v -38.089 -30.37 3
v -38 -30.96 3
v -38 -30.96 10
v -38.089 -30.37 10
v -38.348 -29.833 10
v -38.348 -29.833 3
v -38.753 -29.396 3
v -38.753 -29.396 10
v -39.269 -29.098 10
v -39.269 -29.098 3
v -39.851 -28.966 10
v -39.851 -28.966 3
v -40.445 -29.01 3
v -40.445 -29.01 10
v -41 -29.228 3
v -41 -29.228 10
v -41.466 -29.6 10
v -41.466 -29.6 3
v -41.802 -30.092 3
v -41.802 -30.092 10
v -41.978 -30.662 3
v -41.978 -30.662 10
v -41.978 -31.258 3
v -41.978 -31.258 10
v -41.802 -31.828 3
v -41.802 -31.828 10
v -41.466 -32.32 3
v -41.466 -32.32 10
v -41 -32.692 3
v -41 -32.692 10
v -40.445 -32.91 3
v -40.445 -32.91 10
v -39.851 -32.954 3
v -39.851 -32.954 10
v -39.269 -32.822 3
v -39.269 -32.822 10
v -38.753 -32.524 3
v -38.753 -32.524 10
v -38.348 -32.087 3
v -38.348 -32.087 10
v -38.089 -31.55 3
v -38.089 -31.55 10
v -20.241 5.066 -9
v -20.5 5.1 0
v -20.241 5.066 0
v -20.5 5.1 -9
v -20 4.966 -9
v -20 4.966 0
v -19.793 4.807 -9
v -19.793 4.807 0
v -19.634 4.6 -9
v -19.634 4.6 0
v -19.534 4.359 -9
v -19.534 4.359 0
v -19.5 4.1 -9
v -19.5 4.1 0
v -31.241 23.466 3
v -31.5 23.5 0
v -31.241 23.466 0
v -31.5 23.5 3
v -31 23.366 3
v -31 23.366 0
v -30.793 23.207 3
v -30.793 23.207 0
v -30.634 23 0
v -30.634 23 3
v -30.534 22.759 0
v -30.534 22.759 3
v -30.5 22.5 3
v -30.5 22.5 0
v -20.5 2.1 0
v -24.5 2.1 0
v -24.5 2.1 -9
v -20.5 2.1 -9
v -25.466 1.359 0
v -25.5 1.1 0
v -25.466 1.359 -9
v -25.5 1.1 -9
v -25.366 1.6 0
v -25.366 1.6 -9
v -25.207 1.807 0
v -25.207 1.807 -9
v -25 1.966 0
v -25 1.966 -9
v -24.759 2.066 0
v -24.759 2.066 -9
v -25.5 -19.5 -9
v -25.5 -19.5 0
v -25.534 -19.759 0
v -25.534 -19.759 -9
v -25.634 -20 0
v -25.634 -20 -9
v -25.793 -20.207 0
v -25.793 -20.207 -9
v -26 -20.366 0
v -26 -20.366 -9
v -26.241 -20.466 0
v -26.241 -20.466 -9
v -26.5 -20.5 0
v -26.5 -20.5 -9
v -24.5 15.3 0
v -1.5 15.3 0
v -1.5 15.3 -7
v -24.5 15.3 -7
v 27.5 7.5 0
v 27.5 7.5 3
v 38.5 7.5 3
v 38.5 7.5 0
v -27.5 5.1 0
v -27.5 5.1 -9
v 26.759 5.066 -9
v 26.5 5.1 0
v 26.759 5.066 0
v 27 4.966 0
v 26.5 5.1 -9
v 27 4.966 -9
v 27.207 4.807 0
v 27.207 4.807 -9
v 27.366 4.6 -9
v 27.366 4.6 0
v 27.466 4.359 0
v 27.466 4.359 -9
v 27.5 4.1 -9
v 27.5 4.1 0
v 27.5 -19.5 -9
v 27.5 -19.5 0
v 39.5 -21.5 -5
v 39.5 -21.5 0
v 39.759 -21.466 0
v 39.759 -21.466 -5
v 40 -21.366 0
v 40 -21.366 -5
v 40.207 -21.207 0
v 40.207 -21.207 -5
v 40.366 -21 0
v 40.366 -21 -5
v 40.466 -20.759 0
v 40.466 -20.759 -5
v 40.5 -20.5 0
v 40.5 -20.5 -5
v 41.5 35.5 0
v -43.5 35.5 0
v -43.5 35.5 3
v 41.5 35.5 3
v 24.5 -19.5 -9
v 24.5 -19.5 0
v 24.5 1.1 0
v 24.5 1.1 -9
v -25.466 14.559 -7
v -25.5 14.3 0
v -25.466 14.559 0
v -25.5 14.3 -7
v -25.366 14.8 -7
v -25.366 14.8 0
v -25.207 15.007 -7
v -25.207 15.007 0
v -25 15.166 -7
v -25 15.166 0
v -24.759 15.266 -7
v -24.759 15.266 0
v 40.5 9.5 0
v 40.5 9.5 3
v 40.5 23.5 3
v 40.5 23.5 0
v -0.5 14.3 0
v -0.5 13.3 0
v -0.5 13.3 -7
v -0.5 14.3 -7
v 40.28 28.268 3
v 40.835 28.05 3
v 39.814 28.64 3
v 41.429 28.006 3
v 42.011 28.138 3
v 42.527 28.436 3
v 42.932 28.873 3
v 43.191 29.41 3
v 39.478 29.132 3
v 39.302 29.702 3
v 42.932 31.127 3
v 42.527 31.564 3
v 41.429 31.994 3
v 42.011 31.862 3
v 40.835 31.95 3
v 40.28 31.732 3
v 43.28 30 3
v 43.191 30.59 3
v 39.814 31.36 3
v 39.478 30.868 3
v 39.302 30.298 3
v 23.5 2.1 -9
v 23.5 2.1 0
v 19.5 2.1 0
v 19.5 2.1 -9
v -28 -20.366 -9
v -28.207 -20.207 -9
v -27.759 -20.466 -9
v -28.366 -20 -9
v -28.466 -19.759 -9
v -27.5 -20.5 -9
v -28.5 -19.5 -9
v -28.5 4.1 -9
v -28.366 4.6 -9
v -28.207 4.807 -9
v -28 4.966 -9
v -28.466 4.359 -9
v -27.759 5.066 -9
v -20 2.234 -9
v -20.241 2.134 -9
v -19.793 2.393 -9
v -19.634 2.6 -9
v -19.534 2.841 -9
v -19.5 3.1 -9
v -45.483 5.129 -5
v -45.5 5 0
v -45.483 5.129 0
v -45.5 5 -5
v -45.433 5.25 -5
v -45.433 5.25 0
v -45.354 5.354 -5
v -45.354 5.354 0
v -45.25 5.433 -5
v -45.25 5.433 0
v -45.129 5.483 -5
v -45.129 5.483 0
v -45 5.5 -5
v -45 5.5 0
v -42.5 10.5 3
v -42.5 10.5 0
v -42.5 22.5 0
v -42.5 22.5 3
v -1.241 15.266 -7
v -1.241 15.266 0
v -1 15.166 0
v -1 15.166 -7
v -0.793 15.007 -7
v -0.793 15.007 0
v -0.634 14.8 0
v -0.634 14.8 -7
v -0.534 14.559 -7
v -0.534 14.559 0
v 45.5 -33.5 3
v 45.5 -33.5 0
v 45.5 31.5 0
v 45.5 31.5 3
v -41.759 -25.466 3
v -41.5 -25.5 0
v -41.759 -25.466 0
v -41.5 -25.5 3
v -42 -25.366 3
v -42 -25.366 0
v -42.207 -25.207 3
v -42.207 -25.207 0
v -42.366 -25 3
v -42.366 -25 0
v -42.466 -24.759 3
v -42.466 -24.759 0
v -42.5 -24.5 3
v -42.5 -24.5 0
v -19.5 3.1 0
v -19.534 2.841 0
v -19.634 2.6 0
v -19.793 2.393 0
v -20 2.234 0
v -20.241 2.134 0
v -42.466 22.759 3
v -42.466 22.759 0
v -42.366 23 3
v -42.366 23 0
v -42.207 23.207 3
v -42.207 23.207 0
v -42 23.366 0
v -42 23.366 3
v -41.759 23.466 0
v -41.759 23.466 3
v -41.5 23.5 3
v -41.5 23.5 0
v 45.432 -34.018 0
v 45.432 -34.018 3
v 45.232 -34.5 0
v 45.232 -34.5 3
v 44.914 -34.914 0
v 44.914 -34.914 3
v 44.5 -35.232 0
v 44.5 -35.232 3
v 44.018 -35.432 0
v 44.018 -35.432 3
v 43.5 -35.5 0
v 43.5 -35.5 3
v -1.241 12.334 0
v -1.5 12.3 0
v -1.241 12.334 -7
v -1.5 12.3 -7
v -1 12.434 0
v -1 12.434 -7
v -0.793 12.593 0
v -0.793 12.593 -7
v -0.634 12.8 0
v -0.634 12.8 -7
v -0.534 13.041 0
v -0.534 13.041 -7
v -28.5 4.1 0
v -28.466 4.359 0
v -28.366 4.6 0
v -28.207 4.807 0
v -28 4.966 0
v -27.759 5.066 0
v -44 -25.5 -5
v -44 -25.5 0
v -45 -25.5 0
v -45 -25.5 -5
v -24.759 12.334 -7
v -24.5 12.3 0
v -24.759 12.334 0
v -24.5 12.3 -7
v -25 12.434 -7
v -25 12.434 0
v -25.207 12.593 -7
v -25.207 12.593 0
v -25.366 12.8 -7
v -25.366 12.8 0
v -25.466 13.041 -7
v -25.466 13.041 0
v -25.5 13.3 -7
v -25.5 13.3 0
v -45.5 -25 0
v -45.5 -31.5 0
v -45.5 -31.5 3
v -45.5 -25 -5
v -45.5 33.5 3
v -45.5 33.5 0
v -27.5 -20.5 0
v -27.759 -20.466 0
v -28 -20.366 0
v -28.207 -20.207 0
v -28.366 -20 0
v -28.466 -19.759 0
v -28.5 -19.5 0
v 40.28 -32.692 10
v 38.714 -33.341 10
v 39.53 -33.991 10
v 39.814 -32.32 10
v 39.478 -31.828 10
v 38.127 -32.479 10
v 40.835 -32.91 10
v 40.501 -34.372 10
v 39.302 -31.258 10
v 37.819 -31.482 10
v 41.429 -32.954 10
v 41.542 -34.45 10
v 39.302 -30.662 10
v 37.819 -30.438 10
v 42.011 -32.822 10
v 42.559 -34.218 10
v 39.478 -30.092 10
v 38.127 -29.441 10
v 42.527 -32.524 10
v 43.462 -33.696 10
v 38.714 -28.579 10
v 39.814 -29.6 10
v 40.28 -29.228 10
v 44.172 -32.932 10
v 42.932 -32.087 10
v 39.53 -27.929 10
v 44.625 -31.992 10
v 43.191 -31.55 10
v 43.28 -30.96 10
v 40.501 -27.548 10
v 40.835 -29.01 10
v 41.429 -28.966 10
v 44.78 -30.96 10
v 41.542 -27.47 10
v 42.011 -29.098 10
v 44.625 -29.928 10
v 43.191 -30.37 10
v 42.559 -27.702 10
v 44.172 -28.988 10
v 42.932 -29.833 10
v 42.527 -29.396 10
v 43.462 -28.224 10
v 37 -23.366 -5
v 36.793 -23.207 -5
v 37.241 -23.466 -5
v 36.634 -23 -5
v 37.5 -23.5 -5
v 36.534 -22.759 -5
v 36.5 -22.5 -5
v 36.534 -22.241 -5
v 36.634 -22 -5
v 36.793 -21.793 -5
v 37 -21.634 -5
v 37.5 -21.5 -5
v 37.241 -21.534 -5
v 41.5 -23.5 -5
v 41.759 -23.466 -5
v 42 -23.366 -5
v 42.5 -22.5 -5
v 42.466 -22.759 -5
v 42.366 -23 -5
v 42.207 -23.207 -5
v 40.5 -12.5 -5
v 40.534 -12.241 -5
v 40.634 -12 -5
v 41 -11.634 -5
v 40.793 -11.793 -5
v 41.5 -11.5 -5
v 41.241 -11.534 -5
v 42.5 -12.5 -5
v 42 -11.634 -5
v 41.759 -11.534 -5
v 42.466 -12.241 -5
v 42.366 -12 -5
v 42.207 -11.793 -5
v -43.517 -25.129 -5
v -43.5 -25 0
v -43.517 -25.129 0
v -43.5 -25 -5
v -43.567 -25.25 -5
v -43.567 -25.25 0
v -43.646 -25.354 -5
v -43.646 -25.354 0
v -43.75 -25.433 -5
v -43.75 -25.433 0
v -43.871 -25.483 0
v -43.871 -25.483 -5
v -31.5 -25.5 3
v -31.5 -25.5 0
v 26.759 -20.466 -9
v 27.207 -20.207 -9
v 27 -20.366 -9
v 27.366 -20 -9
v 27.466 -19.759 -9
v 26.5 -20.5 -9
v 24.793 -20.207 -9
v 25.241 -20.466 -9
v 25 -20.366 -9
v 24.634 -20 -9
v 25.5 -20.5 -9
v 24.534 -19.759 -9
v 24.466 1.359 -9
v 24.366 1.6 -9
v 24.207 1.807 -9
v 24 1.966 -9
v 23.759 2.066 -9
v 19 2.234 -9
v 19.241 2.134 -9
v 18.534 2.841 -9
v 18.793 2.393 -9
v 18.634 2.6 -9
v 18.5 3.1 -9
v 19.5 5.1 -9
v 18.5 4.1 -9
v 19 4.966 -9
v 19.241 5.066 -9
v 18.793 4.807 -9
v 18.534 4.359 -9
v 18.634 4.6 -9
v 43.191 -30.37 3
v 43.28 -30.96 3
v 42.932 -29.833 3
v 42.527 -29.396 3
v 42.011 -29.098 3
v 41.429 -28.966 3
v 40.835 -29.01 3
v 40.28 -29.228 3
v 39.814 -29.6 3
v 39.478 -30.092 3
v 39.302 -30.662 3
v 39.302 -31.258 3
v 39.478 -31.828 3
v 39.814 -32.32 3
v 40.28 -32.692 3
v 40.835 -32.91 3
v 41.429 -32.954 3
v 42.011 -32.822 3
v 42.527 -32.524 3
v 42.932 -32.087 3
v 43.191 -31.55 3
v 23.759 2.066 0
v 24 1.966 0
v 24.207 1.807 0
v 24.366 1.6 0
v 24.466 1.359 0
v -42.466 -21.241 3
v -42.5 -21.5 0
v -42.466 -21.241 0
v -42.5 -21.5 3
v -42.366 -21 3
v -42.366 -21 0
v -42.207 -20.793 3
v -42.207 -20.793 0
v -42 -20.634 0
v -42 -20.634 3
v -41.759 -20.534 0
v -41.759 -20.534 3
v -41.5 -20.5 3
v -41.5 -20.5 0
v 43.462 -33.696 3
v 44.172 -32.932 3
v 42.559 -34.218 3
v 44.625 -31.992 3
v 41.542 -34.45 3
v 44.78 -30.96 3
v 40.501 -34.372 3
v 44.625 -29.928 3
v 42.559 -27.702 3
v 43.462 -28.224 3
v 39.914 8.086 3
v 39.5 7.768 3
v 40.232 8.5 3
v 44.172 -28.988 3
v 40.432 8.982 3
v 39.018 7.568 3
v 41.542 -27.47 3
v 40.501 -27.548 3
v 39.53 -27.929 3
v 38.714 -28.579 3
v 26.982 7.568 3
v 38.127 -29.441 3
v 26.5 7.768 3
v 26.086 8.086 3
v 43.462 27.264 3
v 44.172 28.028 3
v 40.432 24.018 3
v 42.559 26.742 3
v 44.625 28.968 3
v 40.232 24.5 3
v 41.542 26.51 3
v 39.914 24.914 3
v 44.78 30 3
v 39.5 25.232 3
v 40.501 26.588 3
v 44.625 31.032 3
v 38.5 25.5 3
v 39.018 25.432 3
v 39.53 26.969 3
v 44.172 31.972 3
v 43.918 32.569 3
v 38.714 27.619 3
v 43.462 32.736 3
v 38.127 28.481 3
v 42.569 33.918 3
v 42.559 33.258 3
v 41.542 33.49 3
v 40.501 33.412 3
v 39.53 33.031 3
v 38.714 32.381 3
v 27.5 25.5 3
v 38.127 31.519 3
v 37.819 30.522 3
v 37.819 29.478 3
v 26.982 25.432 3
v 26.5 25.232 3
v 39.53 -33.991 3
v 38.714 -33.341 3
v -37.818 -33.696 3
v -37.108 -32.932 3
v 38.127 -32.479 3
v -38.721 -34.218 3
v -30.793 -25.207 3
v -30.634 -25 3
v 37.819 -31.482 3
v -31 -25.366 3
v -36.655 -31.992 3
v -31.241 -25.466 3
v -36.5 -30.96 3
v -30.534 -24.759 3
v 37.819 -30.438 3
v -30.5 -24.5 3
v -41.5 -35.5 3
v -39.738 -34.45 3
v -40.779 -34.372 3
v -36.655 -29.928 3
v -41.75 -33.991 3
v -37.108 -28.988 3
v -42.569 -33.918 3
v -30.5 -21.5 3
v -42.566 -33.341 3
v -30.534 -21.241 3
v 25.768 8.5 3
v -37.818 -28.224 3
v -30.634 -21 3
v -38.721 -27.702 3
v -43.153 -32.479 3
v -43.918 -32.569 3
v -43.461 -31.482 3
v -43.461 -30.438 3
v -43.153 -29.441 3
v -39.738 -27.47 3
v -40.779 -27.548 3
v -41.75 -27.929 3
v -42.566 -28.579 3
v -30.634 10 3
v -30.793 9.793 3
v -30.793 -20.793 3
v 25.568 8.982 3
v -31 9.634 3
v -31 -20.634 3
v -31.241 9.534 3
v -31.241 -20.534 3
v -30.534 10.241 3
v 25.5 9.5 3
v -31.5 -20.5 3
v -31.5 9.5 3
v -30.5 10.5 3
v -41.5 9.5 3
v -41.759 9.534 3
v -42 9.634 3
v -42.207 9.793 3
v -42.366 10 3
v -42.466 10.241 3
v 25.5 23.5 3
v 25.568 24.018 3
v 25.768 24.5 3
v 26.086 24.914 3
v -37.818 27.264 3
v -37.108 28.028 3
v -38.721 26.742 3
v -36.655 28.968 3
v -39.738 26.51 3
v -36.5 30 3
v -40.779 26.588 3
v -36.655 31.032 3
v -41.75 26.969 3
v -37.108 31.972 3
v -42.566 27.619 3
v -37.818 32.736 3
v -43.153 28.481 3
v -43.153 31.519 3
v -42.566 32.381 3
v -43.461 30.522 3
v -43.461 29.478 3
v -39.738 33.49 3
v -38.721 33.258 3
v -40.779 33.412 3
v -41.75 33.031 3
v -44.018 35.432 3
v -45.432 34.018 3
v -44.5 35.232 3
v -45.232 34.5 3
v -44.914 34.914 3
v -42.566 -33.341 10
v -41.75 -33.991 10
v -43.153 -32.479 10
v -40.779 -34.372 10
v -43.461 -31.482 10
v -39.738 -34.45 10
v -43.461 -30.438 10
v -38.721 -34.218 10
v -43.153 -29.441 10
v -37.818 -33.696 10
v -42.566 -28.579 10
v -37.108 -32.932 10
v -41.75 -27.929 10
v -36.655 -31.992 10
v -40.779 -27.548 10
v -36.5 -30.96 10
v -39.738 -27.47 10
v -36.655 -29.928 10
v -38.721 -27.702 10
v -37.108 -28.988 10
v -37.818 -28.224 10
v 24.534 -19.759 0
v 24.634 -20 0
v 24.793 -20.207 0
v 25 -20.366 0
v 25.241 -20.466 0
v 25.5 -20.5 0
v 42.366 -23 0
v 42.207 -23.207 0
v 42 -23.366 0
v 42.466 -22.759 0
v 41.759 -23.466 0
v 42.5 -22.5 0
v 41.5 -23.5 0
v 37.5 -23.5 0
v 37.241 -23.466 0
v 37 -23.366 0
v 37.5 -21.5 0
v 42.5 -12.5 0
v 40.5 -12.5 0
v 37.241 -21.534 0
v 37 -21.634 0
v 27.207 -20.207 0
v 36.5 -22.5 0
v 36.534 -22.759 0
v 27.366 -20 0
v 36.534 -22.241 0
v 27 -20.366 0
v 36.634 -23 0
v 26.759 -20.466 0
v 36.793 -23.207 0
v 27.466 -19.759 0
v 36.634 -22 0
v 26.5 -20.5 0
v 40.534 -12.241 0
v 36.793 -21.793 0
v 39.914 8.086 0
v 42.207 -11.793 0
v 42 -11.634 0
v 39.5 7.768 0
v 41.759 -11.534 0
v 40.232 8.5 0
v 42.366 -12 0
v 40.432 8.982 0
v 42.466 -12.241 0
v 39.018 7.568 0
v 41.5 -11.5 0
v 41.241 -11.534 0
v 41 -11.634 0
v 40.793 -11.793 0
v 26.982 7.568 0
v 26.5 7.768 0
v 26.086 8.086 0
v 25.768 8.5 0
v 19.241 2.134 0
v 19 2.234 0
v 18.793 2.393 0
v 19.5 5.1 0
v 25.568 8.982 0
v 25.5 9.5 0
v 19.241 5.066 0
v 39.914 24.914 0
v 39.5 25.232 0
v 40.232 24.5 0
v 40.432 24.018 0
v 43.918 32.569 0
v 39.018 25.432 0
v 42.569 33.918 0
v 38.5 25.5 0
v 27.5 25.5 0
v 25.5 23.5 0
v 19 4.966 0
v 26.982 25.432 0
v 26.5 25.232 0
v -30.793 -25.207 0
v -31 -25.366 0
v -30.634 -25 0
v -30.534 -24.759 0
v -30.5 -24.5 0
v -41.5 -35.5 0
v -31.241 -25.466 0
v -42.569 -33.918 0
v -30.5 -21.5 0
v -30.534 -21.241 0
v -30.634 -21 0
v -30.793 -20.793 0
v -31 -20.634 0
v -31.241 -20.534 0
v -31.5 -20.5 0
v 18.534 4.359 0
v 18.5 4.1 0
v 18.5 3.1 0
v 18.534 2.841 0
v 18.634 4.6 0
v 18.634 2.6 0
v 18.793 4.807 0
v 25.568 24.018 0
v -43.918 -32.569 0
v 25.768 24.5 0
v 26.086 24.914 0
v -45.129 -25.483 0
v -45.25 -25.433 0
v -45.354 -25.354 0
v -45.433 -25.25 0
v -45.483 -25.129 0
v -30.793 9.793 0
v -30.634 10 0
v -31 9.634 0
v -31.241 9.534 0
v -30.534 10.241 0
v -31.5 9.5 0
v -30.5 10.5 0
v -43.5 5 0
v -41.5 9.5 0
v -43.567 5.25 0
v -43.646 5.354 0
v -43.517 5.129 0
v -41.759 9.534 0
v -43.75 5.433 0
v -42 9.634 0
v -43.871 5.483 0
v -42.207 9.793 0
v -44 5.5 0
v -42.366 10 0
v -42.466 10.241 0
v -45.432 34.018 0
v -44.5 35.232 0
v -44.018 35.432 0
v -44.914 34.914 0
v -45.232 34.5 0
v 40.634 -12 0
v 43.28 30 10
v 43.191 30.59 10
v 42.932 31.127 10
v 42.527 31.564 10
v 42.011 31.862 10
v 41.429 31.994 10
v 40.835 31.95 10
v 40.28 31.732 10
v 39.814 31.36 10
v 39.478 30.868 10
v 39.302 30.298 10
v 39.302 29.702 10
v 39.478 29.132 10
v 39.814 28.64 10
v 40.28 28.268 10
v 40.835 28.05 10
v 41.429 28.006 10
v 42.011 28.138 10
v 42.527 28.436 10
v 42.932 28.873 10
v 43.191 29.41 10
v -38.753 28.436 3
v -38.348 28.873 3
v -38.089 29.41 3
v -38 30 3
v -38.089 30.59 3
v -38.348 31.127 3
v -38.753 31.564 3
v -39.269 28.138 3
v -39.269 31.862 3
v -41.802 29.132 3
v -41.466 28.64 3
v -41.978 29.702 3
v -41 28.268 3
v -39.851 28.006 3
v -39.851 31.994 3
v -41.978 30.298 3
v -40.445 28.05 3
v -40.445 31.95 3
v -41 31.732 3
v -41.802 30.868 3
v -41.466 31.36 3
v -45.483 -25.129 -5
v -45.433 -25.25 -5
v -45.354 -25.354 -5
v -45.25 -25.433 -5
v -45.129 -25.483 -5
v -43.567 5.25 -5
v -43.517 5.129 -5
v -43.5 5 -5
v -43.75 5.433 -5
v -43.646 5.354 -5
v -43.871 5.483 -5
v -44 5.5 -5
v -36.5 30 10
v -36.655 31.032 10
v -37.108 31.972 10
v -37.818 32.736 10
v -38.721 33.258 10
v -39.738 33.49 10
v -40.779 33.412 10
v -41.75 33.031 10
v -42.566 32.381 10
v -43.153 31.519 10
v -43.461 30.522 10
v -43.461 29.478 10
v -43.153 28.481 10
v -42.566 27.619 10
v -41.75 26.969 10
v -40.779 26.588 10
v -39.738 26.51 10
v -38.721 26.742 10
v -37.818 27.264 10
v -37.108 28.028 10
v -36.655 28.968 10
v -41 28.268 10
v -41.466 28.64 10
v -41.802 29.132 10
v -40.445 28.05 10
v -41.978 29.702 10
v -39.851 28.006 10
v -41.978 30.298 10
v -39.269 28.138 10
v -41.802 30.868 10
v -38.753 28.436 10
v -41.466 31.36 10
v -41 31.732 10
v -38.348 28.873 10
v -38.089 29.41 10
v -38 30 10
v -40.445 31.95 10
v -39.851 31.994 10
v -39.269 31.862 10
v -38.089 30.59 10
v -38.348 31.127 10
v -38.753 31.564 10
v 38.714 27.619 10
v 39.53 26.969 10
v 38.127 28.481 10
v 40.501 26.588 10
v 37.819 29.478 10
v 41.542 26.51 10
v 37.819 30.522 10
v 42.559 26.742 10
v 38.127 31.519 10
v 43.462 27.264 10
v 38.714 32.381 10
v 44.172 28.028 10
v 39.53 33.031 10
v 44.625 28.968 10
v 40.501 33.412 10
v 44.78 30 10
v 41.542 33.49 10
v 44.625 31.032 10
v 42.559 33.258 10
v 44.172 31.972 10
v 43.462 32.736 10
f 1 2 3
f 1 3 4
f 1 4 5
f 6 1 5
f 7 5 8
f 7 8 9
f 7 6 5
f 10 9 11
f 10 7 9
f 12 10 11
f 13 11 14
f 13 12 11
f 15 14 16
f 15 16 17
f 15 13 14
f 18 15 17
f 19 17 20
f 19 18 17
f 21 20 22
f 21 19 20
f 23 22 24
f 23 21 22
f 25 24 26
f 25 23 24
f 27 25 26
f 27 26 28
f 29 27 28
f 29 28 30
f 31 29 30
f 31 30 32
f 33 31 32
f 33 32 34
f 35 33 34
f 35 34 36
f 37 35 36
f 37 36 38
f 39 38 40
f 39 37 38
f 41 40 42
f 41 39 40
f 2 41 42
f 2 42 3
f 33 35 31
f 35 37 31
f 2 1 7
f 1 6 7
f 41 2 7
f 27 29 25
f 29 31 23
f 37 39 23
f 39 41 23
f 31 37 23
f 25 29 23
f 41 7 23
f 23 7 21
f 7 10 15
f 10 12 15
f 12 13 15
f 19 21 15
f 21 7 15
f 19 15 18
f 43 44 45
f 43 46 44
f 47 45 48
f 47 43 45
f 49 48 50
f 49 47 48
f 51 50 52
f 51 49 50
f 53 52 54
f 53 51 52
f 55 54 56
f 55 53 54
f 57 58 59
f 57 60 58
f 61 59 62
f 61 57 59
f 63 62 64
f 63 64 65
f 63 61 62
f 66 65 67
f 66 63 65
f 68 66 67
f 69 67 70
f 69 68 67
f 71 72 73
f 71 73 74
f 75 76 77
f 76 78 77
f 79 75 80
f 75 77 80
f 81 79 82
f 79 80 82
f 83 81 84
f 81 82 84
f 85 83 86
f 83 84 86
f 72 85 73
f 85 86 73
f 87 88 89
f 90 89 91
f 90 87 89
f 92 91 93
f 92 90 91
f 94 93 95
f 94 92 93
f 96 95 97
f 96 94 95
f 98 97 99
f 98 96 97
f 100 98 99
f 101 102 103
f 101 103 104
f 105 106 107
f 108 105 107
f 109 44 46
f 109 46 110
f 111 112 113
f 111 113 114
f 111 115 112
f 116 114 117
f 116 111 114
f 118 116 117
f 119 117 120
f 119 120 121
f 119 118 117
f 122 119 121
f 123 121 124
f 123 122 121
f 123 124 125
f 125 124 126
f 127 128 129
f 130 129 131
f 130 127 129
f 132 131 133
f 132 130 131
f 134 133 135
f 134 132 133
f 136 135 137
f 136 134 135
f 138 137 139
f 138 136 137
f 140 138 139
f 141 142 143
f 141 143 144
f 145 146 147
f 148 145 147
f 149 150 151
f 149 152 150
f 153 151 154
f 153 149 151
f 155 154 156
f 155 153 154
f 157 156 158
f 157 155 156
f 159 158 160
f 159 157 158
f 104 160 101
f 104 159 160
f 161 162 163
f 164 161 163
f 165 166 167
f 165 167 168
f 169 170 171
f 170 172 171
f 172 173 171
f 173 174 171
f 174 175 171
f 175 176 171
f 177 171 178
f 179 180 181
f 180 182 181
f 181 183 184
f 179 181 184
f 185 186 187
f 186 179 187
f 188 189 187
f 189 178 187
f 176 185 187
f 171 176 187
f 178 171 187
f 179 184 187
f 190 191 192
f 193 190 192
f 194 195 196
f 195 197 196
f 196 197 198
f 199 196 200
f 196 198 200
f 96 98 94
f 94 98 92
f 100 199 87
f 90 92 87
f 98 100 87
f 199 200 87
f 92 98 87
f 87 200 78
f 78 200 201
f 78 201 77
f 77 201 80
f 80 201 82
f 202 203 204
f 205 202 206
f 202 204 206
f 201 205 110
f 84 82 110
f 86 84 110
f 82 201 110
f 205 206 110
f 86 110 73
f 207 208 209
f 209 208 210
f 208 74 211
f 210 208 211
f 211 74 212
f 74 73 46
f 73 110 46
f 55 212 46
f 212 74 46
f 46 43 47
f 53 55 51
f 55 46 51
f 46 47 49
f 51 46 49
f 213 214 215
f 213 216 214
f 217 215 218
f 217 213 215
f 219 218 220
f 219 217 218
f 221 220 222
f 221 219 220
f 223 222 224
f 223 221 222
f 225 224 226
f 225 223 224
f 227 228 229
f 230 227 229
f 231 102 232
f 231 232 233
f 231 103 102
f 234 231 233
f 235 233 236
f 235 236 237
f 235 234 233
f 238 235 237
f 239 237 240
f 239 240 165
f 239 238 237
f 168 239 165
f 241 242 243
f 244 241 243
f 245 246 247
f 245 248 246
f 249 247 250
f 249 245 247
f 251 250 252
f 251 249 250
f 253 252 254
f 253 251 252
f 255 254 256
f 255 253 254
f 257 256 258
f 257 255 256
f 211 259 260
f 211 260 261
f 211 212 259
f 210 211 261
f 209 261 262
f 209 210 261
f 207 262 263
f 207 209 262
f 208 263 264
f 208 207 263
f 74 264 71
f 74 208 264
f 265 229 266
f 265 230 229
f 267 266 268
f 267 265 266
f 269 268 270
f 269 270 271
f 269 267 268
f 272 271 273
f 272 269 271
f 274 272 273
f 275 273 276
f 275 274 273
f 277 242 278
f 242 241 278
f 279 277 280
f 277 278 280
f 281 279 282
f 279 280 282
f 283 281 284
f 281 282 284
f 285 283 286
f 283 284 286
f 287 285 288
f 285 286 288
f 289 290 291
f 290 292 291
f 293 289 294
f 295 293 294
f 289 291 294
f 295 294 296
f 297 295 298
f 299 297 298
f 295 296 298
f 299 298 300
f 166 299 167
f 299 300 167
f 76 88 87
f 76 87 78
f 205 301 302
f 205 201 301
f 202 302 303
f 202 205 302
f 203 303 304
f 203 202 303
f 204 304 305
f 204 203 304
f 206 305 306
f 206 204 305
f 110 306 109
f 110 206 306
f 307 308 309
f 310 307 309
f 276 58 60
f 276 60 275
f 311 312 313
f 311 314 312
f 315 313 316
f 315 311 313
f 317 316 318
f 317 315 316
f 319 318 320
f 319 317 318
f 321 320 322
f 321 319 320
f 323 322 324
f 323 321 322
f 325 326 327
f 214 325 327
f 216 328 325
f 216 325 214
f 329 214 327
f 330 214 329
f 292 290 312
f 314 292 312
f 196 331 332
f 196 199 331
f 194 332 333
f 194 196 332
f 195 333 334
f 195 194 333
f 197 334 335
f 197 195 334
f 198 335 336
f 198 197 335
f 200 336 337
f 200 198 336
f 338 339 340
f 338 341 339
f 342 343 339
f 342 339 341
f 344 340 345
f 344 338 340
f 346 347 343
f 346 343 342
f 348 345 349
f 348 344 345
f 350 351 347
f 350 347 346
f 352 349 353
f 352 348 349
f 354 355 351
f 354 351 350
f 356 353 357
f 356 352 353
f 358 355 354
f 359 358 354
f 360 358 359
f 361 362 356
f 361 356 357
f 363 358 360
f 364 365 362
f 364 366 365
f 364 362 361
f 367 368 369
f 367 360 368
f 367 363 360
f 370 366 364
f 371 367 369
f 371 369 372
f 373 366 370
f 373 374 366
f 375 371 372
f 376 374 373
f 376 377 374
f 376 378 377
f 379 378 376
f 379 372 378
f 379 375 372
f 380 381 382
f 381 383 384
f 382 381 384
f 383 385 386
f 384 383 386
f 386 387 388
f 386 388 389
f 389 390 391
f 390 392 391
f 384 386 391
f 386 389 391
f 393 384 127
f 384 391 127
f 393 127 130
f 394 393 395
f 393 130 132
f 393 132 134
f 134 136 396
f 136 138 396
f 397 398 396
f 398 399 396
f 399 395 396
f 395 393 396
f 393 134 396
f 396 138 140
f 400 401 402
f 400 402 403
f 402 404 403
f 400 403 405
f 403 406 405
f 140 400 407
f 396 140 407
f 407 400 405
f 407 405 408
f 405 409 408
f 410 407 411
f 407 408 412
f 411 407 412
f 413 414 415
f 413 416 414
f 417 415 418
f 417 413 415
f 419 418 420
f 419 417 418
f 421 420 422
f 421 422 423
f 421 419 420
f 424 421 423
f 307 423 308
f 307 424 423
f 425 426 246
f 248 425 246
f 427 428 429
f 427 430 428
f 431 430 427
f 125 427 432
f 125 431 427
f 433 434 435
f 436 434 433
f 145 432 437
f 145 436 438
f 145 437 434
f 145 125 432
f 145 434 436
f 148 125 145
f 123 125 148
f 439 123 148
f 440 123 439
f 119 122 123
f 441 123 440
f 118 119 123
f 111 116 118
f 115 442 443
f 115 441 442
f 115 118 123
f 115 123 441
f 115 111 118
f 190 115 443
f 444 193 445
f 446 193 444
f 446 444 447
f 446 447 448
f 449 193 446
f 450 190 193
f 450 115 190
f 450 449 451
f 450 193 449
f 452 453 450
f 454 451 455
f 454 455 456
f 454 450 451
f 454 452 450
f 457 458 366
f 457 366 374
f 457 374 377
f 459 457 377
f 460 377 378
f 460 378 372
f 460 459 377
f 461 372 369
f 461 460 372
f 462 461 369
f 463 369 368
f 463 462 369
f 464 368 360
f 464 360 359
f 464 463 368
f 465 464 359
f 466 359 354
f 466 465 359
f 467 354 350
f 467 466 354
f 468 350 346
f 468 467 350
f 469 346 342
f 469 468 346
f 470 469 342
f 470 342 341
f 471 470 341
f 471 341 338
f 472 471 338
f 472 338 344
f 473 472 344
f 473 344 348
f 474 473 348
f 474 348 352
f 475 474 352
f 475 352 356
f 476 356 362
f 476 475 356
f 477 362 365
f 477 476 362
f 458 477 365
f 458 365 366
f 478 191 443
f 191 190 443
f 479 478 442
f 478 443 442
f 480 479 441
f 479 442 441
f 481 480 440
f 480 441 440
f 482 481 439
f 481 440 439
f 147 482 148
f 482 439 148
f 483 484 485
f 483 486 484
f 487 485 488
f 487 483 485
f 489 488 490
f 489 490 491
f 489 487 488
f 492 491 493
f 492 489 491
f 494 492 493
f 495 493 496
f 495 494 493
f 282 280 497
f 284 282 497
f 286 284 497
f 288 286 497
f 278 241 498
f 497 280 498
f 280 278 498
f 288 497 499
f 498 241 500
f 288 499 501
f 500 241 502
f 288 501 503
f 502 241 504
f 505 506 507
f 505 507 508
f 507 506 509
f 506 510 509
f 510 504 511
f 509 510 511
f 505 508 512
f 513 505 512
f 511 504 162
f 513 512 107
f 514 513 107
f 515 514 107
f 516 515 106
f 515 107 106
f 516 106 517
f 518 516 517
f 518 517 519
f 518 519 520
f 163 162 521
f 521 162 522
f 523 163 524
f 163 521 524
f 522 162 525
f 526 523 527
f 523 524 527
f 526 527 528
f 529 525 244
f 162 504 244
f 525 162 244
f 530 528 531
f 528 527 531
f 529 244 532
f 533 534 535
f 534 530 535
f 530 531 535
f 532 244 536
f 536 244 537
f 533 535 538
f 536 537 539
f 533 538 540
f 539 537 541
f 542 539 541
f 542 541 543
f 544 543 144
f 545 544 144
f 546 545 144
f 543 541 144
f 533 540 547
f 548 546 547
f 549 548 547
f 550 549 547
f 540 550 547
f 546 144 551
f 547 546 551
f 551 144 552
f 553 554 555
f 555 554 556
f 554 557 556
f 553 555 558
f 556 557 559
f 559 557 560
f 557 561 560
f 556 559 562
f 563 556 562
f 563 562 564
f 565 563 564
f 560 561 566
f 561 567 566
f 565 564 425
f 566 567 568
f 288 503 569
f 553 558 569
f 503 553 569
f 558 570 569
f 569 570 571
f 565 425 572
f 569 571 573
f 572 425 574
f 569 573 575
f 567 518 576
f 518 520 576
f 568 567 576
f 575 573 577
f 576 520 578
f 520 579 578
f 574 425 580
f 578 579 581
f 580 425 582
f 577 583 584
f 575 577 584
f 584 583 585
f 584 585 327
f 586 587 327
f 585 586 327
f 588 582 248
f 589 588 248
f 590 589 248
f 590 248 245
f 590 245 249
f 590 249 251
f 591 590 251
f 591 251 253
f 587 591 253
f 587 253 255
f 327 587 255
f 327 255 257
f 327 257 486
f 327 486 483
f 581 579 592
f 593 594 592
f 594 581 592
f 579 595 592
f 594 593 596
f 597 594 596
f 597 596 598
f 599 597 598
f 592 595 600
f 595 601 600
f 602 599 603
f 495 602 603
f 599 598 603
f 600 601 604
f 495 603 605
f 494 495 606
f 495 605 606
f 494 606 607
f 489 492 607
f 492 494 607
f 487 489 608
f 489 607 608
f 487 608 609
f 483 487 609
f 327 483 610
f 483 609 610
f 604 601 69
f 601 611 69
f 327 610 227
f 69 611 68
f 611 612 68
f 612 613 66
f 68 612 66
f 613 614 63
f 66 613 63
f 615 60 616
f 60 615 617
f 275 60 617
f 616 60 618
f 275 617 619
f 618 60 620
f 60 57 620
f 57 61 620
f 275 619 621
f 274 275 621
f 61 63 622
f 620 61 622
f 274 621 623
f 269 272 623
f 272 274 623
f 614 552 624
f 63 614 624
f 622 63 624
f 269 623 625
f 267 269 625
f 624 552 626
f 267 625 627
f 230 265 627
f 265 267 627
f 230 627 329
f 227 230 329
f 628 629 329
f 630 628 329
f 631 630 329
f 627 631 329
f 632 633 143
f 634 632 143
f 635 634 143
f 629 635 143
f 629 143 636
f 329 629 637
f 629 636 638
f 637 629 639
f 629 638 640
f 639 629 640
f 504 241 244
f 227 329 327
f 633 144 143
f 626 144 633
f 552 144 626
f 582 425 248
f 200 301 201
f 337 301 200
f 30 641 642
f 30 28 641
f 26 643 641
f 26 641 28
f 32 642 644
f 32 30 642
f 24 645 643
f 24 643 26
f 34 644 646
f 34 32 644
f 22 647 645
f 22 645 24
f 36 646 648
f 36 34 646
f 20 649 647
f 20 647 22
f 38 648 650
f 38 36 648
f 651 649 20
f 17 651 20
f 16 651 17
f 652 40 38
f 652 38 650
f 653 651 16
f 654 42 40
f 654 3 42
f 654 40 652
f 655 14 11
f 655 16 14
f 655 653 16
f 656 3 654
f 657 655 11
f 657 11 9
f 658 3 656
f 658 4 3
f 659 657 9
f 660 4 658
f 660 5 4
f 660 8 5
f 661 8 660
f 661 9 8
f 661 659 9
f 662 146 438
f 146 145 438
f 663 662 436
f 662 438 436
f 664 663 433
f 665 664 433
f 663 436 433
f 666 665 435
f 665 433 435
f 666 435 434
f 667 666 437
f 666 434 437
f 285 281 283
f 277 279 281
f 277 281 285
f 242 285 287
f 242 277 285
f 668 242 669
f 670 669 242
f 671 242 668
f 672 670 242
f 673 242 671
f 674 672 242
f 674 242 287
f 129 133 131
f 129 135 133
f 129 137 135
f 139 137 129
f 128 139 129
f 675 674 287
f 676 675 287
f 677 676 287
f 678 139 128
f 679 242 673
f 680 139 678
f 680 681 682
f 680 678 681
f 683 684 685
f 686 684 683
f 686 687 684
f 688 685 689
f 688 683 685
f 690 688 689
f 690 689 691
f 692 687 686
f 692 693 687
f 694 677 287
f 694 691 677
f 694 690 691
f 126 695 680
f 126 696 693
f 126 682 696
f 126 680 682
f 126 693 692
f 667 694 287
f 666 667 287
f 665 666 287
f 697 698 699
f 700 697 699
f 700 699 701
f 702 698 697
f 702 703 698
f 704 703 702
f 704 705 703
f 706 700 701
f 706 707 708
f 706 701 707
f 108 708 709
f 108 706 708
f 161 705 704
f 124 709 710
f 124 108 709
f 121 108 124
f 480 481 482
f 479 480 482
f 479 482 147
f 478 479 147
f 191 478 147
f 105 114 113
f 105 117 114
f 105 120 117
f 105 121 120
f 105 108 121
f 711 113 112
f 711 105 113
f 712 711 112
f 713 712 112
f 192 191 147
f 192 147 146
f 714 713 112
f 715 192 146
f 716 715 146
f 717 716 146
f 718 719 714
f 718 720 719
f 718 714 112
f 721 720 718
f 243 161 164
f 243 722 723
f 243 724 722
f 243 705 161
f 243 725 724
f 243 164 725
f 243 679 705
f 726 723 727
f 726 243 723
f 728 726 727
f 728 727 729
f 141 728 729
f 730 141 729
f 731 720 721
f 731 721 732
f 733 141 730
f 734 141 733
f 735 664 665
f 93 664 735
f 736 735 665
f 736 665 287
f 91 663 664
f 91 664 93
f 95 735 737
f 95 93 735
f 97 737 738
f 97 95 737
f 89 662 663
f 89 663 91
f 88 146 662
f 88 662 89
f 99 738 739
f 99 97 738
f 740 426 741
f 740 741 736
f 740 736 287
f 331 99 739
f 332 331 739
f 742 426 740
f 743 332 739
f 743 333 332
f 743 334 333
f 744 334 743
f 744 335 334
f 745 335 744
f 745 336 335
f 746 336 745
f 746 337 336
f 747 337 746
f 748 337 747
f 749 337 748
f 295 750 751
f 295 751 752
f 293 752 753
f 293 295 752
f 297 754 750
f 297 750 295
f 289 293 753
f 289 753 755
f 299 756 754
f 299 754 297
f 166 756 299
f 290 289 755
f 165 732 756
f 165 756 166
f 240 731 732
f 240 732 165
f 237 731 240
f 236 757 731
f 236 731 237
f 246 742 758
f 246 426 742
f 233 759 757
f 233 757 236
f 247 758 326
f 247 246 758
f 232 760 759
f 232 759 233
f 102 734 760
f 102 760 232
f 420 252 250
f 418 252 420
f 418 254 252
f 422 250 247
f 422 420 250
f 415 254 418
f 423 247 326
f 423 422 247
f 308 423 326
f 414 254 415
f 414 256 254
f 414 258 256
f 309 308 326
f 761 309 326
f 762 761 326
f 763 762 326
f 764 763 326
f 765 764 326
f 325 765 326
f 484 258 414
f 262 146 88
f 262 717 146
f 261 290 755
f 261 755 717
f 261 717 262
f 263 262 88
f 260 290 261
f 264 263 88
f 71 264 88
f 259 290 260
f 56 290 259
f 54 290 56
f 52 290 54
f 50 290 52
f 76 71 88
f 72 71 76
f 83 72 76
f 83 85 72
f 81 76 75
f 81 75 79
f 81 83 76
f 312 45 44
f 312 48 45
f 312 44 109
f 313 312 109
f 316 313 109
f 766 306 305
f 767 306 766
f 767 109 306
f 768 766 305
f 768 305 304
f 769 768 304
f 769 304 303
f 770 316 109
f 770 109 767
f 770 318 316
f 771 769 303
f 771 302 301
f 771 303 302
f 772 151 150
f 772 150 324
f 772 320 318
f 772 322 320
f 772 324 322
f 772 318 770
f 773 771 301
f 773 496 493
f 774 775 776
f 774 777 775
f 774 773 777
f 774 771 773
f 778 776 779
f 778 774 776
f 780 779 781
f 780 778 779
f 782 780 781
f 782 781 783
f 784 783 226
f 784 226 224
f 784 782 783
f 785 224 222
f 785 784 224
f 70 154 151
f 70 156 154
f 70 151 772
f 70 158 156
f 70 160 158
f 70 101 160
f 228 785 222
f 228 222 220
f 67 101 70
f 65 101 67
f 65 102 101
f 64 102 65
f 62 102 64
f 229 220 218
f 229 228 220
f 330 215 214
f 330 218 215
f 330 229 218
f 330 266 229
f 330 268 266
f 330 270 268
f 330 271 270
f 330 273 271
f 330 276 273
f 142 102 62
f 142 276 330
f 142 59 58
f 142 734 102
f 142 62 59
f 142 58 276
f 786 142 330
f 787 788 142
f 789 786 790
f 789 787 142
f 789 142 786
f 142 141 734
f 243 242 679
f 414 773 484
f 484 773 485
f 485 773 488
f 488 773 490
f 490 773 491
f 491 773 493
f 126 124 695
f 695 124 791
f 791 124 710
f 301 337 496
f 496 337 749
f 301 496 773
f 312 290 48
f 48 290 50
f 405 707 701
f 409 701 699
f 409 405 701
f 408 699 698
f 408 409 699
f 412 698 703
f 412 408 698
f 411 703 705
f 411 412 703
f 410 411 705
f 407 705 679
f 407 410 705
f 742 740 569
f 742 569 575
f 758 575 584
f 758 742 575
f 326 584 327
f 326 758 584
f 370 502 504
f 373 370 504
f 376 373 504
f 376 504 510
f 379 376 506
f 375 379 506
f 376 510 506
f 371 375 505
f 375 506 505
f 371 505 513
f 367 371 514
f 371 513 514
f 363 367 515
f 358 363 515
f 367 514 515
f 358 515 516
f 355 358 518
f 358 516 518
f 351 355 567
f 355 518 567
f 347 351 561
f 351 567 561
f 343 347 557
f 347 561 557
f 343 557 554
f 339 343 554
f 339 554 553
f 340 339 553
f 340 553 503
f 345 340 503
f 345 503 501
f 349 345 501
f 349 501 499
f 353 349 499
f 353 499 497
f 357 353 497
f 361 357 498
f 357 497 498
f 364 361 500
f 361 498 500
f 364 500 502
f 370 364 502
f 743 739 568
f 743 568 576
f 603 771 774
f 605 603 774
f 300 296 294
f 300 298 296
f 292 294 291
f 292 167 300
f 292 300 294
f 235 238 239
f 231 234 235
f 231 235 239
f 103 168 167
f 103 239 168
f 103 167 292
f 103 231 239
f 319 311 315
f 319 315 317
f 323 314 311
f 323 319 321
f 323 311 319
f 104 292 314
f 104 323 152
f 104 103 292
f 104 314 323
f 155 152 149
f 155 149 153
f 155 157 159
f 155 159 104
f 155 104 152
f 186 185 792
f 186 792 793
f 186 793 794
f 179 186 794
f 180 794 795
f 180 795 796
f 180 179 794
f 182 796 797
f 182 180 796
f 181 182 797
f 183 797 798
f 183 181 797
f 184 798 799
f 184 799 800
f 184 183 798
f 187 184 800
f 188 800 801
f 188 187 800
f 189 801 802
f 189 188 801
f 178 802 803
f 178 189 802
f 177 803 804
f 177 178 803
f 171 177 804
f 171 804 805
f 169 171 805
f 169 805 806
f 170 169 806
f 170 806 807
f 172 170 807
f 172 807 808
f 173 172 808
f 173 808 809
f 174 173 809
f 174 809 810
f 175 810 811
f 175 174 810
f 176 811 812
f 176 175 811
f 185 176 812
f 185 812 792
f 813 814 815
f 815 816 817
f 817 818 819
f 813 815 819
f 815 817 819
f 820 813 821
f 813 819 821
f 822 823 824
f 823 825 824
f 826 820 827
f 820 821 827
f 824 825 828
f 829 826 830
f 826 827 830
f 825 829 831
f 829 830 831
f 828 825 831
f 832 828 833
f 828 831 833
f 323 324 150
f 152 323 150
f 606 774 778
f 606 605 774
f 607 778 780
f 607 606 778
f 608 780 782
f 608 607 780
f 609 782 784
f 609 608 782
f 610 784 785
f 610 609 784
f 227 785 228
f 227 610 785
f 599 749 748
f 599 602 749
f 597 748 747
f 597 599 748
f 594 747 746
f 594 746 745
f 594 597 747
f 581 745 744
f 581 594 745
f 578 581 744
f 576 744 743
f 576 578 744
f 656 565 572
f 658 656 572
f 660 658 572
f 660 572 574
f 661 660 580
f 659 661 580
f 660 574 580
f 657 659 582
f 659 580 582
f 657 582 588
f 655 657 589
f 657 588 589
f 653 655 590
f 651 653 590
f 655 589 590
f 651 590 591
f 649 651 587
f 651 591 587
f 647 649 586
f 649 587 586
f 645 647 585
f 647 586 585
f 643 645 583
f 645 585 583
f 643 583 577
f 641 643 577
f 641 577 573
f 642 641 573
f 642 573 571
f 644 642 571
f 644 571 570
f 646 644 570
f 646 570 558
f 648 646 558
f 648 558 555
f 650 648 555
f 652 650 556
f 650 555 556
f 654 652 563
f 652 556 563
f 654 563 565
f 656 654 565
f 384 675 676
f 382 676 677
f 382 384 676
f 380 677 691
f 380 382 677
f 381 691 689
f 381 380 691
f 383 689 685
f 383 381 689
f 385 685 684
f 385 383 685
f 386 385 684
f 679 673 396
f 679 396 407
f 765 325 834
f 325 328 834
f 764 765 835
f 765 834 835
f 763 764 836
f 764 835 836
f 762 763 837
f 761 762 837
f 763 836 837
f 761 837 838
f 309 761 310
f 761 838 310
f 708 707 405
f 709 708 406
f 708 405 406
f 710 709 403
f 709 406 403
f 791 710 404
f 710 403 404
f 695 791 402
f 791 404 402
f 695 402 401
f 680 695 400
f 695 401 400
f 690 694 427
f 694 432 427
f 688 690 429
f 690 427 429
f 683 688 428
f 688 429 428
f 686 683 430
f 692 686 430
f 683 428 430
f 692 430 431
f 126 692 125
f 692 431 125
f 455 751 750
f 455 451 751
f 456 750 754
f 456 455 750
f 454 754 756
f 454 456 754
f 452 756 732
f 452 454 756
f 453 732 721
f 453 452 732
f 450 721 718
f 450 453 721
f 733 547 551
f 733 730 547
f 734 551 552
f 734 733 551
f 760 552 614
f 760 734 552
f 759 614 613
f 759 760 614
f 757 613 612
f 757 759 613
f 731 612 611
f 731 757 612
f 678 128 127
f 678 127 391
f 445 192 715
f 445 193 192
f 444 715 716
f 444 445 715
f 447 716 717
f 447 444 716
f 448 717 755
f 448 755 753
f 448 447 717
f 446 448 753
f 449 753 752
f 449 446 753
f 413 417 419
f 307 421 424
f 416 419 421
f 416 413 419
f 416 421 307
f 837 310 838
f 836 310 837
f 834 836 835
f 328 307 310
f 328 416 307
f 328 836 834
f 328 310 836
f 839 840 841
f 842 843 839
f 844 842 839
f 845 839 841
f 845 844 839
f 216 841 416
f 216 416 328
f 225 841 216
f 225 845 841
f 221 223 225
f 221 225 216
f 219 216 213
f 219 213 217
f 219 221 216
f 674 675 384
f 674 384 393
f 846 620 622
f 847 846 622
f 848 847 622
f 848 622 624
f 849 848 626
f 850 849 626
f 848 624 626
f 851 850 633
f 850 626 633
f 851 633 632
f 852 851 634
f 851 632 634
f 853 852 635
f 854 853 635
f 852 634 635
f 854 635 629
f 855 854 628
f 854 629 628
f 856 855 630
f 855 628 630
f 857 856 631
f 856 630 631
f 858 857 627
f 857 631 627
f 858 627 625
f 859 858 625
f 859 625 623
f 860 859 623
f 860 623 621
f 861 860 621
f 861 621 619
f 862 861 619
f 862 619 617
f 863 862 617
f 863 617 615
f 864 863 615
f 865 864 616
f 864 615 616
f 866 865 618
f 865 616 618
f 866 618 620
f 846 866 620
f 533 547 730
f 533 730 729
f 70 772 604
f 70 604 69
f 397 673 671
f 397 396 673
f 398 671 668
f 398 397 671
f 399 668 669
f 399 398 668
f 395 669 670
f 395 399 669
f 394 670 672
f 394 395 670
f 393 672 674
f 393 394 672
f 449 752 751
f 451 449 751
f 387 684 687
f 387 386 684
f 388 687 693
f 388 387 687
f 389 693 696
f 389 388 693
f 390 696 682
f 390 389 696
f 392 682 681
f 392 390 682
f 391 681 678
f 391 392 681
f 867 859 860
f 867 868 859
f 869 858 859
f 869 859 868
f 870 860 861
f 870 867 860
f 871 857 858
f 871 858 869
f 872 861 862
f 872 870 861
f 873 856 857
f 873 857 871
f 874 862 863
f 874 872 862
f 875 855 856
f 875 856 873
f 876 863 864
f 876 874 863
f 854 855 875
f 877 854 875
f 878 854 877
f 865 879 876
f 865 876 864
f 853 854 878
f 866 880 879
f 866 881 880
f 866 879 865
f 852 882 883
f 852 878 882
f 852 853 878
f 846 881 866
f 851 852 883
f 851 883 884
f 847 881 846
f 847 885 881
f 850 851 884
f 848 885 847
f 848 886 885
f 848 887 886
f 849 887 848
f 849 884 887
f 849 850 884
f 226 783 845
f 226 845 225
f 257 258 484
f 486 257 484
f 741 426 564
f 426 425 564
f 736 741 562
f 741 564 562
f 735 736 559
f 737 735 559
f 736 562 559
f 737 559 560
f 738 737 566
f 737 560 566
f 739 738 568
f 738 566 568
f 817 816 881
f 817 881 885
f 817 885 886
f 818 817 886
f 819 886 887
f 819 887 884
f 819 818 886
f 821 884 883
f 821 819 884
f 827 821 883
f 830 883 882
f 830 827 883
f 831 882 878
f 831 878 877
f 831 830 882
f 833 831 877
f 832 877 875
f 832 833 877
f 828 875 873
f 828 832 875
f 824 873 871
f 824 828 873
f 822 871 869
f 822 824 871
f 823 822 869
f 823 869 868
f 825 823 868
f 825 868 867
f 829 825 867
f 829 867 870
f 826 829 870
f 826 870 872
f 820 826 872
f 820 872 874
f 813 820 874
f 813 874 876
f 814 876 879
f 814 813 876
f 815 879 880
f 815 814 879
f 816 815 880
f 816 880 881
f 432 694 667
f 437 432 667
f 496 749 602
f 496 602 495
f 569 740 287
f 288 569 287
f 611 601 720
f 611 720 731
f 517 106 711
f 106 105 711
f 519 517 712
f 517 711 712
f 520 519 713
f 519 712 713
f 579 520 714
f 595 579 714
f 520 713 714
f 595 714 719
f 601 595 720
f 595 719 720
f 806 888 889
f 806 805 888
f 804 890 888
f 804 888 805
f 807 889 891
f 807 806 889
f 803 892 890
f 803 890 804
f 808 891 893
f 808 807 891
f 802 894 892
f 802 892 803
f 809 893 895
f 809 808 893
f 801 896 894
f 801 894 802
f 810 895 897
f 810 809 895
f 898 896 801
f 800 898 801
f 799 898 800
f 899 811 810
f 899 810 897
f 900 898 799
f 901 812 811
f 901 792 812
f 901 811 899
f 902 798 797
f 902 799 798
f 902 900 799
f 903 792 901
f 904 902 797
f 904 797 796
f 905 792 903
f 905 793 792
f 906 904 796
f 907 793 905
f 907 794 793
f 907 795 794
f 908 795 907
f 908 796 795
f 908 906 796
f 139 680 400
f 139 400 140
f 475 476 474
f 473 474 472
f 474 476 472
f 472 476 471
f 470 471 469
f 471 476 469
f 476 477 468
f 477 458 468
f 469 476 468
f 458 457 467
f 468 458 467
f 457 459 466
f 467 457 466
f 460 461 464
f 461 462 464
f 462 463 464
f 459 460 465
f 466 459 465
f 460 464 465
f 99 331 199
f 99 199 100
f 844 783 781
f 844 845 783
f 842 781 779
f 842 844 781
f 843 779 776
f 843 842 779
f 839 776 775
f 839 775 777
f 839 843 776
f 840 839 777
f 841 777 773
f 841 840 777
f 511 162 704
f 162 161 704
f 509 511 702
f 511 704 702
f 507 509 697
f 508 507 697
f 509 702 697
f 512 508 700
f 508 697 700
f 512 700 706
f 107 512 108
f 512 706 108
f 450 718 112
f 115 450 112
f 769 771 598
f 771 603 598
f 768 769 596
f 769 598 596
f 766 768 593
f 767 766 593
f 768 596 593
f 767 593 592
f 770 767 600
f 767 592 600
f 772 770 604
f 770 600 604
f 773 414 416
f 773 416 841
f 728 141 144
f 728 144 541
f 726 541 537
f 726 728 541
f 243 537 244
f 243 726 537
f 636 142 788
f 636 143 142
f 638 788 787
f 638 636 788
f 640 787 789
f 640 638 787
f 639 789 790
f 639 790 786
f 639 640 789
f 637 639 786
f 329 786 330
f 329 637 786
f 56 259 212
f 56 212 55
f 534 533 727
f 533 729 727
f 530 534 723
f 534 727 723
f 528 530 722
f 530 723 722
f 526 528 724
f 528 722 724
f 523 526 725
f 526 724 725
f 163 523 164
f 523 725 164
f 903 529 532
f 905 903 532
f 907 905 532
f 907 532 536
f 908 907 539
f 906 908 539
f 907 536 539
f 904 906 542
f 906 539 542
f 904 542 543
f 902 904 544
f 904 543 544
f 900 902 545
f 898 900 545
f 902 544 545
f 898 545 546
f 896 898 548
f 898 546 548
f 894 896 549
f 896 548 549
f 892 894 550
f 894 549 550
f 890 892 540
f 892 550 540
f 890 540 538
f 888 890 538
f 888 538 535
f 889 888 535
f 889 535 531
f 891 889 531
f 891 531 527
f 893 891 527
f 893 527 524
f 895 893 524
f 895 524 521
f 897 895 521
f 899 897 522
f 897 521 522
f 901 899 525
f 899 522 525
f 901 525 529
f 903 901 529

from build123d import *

# Parameters (mm, degrees)
SKETCH1_W            = 91
SKETCH1_H            = 71
BOSS_EXTRUDE1_DEPTH  = 3
SKETCH3_W            = 4
SKETCH3_H            = 4
CUT_EXTRUDE1_DEPTH   = 5
FILLET2_R            = 10
FILLET3_R            = 2
SKETCH4_W            = 15
SKETCH4_H            = 18
CUT_EXTRUDE2_DEPTH   = 5
SKETCH5_R            = 3.5
SKETCH5_R_2          = 2
BOSS_EXTRUDE2_DEPTH  = 7
LPATTERN1_COUNT      = 2
LPATTERN1_PITCH      = 81.28
LPATTERN1_COUNT_DIR2 = 2
LPATTERN1_PITCH_DIR2 = 60.96
FILLET4_R            = 2
BOSS_EXTRUDE4_DEPTH  = 9
FILLET5_R            = 1
BOSS_EXTRUDE5_DEPTH  = 5
FILLET6_R            = 1
SKETCH9_W            = 25
SKETCH9_H            = 3
BOSS_EXTRUDE6_DEPTH  = 7
FILLET7_R            = 1
SKETCH10_W           = 12
SKETCH10_H           = 14
CUT_EXTRUDE3_DEPTH   = 5
FILLET8_R            = 1
CUT_EXTRUDE4_REACH   = 60.57
SKETCH11_W           = 12
SKETCH11_H           = 5
FILLET9_R            = 1
SKETCH12_W           = 2
SKETCH12_H           = 31
BOSS_EXTRUDE7_DEPTH  = 5
FILLET10_R           = 0.5


# Some blends are built 0.0001 mm under size
with BuildPart() as part:
    # Sketch1 → Boss-Extrude1 (new body)
    with BuildSketch(Plane.XY):
        Rectangle(SKETCH1_W, SKETCH1_H)
    extrude(amount=BOSS_EXTRUDE1_DEPTH)

    # Sketch3 → Cut-Extrude1 (cut)
    with BuildSketch(Plane(origin=(0, 0, 0), x_dir=(-1, 0, 0), z_dir=(0, 0, -1))):
        with Locations((-43.5, 33.5)):
            Rectangle(SKETCH3_W, SKETCH3_H)
        with Locations((43.5, -33.5)):
            Rectangle(SKETCH3_W, SKETCH3_H)
    extrude(amount=-CUT_EXTRUDE1_DEPTH, mode=Mode.SUBTRACT)

    # Fillet2
    # the kernel refuses this fillet: 10 mm, written as the material it adds along each edge
    with BuildSketch(Plane(origin=(-41.5, -31.5, 0), x_dir=(0, -1, 0), z_dir=(0, 0, 1))) as fillet2_piece_1:
        with BuildLine():
            CenterArc((8.782329983, -8.782329983), FILLET2_R, 118.570059811, 32.859880379)
            Line((0, -4), (0, 0))
            Line((0, 0), (4, 0))
        make_face()
    extrude(amount=3)
    with BuildSketch(Plane(origin=(41.5, 31.5, 0), x_dir=(1, 0, 0), z_dir=(0, 0, 1))) as fillet2_piece_2:
        with BuildLine():
            CenterArc((8.782329983, 8.782329983), FILLET2_R, 208.570059811, 32.859880379)
            Line((0, 4), (0, 0))
            Line((0, 0), (4, 0))
        make_face()
    extrude(amount=3)

    # Fillet3
    fillet3_edges = [part.edges().sort_by_distance(p)[0] for p in [
        (-45.5, 35.5, 1.5),
        (45.5, -35.5, 1.5),
    ]]
    fillet(fillet3_edges, radius=FILLET3_R)

    # Sketch4 → Cut-Extrude2 (cut)
    with BuildSketch(Plane.XY.offset(3)):
        with Locations((33, 16.5)):
            Rectangle(SKETCH4_W, SKETCH4_H)
    extrude(amount=-CUT_EXTRUDE2_DEPTH, mode=Mode.SUBTRACT)

    # Sketch5 → Boss-Extrude2 (add)
    with BuildSketch(Plane.XY.offset(3)):
        with Locations((-40, 30)):
            Circle(SKETCH5_R)
        with Locations((-40, 30)):
            Circle(SKETCH5_R_2, mode=Mode.SUBTRACT)
    boss_extrude2 = extrude(amount=BOSS_EXTRUDE2_DEPTH)

    # LPattern1: Boss-Extrude2 2 × 2
    with Locations(*[(i * LPATTERN1_PITCH, -j * LPATTERN1_PITCH_DIR2, 0) for i in range(LPATTERN1_COUNT) for j in range(LPATTERN1_COUNT_DIR2) if (i, j) != (0, 0)]):
        add(boss_extrude2)

    # Fillet4
    fillet4_edges = [part.edges().sort_by_distance(p)[0] for p in [
        (25.5, 7.5, 1.5),
        (25.5, 25.5, 1.5),
        (40.5, 25.5, 1.5),
        (40.5, 7.5, 1.5),
    ]]
    fillet(fillet4_edges, radius=FILLET4_R)

    # Sketch7 → Boss-Extrude4 (add)
    with BuildSketch(Plane(origin=(0, 0, 0), x_dir=(-1, 0, 0), z_dir=(0, 0, -1))):
        Polygon((-24.5, 2.1), (-18.5, 2.1), (-18.5, 5.1), (-27.5, 5.1), (-27.5, -20.5), (-24.5, -20.5), align=None)
    boss_extrude4 = extrude(amount=BOSS_EXTRUDE4_DEPTH)

    # Mirror1: Boss-Extrude4 across plane
    add(boss_extrude4.mirror(Plane(origin=(-0.5, 0, 0), x_dir=(0, 0, 1), z_dir=(1, 0, 0))))

    # Fillet5
    fillet5_edges = [part.edges().sort_by_distance(p)[0] for p in [
        (24.5, -20.5, -4.5),
        (24.5, 2.1, -4.5),
        (18.5, 2.1, -4.5),
        (18.5, 5.1, -4.5),
        (27.5, 5.1, -4.5),
        (27.5, -20.5, -4.5),
        (-25.5, 2.1, -4.5),
        (-25.5, -20.5, -4.5),
        (-28.5, -20.5, -4.5),
        (-28.5, 5.1, -4.5),
        (-19.5, 5.1, -4.5),
        (-19.5, 2.1, -4.5),
    ]]
    fillet(fillet5_edges, radius=FILLET5_R)

    # Sketch8 → Boss-Extrude5 (add)
    with BuildSketch(Plane(origin=(0, 0, 0), x_dir=(-1, 0, 0), z_dir=(0, 0, -1))):
        Polygon((-40.5, -11.5), (-40.5, -21.5), (-36.5, -21.5), (-36.5, -23.5), (-42.5, -23.5), (-42.5, -11.5), align=None)
    extrude(amount=BOSS_EXTRUDE5_DEPTH)

    # Fillet6
    fillet6_edges = [part.edges().sort_by_distance(p)[0] for p in [
        (40.5, -11.5, -2.5),
        (40.5, -21.5, -2.5),
        (42.5, -11.5, -2.5),
        (42.5, -23.5, -2.5),
        (36.5, -23.5, -2.5),
        (36.5, -21.5, -2.5),
    ]]
    fillet(fillet6_edges, radius=FILLET6_R - 0.0001)  # a hair under: the kernel refuses the full size

    # Sketch9 → Boss-Extrude6 (add)
    with BuildSketch(Plane(origin=(0, 0, 0), x_dir=(-1, 0, 0), z_dir=(0, 0, -1))):
        with Locations((13, 13.8)):
            Rectangle(SKETCH9_W, SKETCH9_H)
    extrude(amount=BOSS_EXTRUDE6_DEPTH)

    # Fillet7
    fillet7_edges = [part.edges().sort_by_distance(p)[0] for p in [
        (-0.5, 15.3, -3.5),
        (-0.5, 12.3, -3.5),
        (-25.5, 12.3, -3.5),
        (-25.5, 15.3, -3.5),
    ]]
    fillet(fillet7_edges, radius=FILLET7_R)

    # Sketch10 → Cut-Extrude3 (cut)
    with BuildSketch(Plane(origin=(0, 0, 0), x_dir=(-1, 0, 0), z_dir=(0, 0, -1))):
        with Locations((36.5, 16.5)):
            Rectangle(SKETCH10_W, SKETCH10_H)
    extrude(amount=-CUT_EXTRUDE3_DEPTH, mode=Mode.SUBTRACT)

    # Fillet8
    fillet8_edges = [part.edges().sort_by_distance(p)[0] for p in [
        (-30.5, 9.5, 1.5),
        (-30.5, 23.5, 1.5),
        (-42.5, 23.5, 1.5),
        (-42.5, 9.5, 1.5),
    ]]
    fillet(fillet8_edges, radius=FILLET8_R)

    # Sketch11 → Cut-Extrude4 (cut, up to next)
    with BuildSketch(Plane(origin=(0, 0, 0), x_dir=(-1, 0, 0), z_dir=(0, 0, -1)), mode=Mode.PRIVATE) as cut_extrude4_sk1:
        with Locations((36.5, -23)):
            Rectangle(SKETCH11_W, SKETCH11_H)
    cut_extrude4_tool1 = extrude(cut_extrude4_sk1.sketch, amount=-CUT_EXTRUDE4_REACH, mode=Mode.PRIVATE) & part.part
    add(cut_extrude4_tool1.solids().sort_by_distance((-36.5, -23, 0))[0], mode=Mode.SUBTRACT)

    # Fillet9
    fillet9_edges = [part.edges().sort_by_distance(p)[0] for p in [
        (-30.5, -25.5, 1.5),
        (-30.5, -20.5, 1.5),
        (-42.5, -20.5, 1.5),
        (-42.5, -25.5, 1.5),
    ]]
    fillet(fillet9_edges, radius=FILLET9_R)

    # Sketch12 → Boss-Extrude7 (add)
    with BuildSketch(Plane(origin=(0, 0, 0), x_dir=(-1, 0, 0), z_dir=(0, 0, -1))):
        with Locations((44.5, -10)):
            Rectangle(SKETCH12_W, SKETCH12_H)
    extrude(amount=BOSS_EXTRUDE7_DEPTH)

    # Fillet10
    fillet10_edges = [part.edges().sort_by_distance(p)[0] for p in [
        (-43.5, 5.5, -2.5),
        (-43.5, -25.5, -2.5),
        (-45.5, -25.5, -2.5),
        (-45.5, 5.5, -2.5),
    ]]
    fillet(fillet10_edges, radius=FILLET10_R)


solid = part.part
